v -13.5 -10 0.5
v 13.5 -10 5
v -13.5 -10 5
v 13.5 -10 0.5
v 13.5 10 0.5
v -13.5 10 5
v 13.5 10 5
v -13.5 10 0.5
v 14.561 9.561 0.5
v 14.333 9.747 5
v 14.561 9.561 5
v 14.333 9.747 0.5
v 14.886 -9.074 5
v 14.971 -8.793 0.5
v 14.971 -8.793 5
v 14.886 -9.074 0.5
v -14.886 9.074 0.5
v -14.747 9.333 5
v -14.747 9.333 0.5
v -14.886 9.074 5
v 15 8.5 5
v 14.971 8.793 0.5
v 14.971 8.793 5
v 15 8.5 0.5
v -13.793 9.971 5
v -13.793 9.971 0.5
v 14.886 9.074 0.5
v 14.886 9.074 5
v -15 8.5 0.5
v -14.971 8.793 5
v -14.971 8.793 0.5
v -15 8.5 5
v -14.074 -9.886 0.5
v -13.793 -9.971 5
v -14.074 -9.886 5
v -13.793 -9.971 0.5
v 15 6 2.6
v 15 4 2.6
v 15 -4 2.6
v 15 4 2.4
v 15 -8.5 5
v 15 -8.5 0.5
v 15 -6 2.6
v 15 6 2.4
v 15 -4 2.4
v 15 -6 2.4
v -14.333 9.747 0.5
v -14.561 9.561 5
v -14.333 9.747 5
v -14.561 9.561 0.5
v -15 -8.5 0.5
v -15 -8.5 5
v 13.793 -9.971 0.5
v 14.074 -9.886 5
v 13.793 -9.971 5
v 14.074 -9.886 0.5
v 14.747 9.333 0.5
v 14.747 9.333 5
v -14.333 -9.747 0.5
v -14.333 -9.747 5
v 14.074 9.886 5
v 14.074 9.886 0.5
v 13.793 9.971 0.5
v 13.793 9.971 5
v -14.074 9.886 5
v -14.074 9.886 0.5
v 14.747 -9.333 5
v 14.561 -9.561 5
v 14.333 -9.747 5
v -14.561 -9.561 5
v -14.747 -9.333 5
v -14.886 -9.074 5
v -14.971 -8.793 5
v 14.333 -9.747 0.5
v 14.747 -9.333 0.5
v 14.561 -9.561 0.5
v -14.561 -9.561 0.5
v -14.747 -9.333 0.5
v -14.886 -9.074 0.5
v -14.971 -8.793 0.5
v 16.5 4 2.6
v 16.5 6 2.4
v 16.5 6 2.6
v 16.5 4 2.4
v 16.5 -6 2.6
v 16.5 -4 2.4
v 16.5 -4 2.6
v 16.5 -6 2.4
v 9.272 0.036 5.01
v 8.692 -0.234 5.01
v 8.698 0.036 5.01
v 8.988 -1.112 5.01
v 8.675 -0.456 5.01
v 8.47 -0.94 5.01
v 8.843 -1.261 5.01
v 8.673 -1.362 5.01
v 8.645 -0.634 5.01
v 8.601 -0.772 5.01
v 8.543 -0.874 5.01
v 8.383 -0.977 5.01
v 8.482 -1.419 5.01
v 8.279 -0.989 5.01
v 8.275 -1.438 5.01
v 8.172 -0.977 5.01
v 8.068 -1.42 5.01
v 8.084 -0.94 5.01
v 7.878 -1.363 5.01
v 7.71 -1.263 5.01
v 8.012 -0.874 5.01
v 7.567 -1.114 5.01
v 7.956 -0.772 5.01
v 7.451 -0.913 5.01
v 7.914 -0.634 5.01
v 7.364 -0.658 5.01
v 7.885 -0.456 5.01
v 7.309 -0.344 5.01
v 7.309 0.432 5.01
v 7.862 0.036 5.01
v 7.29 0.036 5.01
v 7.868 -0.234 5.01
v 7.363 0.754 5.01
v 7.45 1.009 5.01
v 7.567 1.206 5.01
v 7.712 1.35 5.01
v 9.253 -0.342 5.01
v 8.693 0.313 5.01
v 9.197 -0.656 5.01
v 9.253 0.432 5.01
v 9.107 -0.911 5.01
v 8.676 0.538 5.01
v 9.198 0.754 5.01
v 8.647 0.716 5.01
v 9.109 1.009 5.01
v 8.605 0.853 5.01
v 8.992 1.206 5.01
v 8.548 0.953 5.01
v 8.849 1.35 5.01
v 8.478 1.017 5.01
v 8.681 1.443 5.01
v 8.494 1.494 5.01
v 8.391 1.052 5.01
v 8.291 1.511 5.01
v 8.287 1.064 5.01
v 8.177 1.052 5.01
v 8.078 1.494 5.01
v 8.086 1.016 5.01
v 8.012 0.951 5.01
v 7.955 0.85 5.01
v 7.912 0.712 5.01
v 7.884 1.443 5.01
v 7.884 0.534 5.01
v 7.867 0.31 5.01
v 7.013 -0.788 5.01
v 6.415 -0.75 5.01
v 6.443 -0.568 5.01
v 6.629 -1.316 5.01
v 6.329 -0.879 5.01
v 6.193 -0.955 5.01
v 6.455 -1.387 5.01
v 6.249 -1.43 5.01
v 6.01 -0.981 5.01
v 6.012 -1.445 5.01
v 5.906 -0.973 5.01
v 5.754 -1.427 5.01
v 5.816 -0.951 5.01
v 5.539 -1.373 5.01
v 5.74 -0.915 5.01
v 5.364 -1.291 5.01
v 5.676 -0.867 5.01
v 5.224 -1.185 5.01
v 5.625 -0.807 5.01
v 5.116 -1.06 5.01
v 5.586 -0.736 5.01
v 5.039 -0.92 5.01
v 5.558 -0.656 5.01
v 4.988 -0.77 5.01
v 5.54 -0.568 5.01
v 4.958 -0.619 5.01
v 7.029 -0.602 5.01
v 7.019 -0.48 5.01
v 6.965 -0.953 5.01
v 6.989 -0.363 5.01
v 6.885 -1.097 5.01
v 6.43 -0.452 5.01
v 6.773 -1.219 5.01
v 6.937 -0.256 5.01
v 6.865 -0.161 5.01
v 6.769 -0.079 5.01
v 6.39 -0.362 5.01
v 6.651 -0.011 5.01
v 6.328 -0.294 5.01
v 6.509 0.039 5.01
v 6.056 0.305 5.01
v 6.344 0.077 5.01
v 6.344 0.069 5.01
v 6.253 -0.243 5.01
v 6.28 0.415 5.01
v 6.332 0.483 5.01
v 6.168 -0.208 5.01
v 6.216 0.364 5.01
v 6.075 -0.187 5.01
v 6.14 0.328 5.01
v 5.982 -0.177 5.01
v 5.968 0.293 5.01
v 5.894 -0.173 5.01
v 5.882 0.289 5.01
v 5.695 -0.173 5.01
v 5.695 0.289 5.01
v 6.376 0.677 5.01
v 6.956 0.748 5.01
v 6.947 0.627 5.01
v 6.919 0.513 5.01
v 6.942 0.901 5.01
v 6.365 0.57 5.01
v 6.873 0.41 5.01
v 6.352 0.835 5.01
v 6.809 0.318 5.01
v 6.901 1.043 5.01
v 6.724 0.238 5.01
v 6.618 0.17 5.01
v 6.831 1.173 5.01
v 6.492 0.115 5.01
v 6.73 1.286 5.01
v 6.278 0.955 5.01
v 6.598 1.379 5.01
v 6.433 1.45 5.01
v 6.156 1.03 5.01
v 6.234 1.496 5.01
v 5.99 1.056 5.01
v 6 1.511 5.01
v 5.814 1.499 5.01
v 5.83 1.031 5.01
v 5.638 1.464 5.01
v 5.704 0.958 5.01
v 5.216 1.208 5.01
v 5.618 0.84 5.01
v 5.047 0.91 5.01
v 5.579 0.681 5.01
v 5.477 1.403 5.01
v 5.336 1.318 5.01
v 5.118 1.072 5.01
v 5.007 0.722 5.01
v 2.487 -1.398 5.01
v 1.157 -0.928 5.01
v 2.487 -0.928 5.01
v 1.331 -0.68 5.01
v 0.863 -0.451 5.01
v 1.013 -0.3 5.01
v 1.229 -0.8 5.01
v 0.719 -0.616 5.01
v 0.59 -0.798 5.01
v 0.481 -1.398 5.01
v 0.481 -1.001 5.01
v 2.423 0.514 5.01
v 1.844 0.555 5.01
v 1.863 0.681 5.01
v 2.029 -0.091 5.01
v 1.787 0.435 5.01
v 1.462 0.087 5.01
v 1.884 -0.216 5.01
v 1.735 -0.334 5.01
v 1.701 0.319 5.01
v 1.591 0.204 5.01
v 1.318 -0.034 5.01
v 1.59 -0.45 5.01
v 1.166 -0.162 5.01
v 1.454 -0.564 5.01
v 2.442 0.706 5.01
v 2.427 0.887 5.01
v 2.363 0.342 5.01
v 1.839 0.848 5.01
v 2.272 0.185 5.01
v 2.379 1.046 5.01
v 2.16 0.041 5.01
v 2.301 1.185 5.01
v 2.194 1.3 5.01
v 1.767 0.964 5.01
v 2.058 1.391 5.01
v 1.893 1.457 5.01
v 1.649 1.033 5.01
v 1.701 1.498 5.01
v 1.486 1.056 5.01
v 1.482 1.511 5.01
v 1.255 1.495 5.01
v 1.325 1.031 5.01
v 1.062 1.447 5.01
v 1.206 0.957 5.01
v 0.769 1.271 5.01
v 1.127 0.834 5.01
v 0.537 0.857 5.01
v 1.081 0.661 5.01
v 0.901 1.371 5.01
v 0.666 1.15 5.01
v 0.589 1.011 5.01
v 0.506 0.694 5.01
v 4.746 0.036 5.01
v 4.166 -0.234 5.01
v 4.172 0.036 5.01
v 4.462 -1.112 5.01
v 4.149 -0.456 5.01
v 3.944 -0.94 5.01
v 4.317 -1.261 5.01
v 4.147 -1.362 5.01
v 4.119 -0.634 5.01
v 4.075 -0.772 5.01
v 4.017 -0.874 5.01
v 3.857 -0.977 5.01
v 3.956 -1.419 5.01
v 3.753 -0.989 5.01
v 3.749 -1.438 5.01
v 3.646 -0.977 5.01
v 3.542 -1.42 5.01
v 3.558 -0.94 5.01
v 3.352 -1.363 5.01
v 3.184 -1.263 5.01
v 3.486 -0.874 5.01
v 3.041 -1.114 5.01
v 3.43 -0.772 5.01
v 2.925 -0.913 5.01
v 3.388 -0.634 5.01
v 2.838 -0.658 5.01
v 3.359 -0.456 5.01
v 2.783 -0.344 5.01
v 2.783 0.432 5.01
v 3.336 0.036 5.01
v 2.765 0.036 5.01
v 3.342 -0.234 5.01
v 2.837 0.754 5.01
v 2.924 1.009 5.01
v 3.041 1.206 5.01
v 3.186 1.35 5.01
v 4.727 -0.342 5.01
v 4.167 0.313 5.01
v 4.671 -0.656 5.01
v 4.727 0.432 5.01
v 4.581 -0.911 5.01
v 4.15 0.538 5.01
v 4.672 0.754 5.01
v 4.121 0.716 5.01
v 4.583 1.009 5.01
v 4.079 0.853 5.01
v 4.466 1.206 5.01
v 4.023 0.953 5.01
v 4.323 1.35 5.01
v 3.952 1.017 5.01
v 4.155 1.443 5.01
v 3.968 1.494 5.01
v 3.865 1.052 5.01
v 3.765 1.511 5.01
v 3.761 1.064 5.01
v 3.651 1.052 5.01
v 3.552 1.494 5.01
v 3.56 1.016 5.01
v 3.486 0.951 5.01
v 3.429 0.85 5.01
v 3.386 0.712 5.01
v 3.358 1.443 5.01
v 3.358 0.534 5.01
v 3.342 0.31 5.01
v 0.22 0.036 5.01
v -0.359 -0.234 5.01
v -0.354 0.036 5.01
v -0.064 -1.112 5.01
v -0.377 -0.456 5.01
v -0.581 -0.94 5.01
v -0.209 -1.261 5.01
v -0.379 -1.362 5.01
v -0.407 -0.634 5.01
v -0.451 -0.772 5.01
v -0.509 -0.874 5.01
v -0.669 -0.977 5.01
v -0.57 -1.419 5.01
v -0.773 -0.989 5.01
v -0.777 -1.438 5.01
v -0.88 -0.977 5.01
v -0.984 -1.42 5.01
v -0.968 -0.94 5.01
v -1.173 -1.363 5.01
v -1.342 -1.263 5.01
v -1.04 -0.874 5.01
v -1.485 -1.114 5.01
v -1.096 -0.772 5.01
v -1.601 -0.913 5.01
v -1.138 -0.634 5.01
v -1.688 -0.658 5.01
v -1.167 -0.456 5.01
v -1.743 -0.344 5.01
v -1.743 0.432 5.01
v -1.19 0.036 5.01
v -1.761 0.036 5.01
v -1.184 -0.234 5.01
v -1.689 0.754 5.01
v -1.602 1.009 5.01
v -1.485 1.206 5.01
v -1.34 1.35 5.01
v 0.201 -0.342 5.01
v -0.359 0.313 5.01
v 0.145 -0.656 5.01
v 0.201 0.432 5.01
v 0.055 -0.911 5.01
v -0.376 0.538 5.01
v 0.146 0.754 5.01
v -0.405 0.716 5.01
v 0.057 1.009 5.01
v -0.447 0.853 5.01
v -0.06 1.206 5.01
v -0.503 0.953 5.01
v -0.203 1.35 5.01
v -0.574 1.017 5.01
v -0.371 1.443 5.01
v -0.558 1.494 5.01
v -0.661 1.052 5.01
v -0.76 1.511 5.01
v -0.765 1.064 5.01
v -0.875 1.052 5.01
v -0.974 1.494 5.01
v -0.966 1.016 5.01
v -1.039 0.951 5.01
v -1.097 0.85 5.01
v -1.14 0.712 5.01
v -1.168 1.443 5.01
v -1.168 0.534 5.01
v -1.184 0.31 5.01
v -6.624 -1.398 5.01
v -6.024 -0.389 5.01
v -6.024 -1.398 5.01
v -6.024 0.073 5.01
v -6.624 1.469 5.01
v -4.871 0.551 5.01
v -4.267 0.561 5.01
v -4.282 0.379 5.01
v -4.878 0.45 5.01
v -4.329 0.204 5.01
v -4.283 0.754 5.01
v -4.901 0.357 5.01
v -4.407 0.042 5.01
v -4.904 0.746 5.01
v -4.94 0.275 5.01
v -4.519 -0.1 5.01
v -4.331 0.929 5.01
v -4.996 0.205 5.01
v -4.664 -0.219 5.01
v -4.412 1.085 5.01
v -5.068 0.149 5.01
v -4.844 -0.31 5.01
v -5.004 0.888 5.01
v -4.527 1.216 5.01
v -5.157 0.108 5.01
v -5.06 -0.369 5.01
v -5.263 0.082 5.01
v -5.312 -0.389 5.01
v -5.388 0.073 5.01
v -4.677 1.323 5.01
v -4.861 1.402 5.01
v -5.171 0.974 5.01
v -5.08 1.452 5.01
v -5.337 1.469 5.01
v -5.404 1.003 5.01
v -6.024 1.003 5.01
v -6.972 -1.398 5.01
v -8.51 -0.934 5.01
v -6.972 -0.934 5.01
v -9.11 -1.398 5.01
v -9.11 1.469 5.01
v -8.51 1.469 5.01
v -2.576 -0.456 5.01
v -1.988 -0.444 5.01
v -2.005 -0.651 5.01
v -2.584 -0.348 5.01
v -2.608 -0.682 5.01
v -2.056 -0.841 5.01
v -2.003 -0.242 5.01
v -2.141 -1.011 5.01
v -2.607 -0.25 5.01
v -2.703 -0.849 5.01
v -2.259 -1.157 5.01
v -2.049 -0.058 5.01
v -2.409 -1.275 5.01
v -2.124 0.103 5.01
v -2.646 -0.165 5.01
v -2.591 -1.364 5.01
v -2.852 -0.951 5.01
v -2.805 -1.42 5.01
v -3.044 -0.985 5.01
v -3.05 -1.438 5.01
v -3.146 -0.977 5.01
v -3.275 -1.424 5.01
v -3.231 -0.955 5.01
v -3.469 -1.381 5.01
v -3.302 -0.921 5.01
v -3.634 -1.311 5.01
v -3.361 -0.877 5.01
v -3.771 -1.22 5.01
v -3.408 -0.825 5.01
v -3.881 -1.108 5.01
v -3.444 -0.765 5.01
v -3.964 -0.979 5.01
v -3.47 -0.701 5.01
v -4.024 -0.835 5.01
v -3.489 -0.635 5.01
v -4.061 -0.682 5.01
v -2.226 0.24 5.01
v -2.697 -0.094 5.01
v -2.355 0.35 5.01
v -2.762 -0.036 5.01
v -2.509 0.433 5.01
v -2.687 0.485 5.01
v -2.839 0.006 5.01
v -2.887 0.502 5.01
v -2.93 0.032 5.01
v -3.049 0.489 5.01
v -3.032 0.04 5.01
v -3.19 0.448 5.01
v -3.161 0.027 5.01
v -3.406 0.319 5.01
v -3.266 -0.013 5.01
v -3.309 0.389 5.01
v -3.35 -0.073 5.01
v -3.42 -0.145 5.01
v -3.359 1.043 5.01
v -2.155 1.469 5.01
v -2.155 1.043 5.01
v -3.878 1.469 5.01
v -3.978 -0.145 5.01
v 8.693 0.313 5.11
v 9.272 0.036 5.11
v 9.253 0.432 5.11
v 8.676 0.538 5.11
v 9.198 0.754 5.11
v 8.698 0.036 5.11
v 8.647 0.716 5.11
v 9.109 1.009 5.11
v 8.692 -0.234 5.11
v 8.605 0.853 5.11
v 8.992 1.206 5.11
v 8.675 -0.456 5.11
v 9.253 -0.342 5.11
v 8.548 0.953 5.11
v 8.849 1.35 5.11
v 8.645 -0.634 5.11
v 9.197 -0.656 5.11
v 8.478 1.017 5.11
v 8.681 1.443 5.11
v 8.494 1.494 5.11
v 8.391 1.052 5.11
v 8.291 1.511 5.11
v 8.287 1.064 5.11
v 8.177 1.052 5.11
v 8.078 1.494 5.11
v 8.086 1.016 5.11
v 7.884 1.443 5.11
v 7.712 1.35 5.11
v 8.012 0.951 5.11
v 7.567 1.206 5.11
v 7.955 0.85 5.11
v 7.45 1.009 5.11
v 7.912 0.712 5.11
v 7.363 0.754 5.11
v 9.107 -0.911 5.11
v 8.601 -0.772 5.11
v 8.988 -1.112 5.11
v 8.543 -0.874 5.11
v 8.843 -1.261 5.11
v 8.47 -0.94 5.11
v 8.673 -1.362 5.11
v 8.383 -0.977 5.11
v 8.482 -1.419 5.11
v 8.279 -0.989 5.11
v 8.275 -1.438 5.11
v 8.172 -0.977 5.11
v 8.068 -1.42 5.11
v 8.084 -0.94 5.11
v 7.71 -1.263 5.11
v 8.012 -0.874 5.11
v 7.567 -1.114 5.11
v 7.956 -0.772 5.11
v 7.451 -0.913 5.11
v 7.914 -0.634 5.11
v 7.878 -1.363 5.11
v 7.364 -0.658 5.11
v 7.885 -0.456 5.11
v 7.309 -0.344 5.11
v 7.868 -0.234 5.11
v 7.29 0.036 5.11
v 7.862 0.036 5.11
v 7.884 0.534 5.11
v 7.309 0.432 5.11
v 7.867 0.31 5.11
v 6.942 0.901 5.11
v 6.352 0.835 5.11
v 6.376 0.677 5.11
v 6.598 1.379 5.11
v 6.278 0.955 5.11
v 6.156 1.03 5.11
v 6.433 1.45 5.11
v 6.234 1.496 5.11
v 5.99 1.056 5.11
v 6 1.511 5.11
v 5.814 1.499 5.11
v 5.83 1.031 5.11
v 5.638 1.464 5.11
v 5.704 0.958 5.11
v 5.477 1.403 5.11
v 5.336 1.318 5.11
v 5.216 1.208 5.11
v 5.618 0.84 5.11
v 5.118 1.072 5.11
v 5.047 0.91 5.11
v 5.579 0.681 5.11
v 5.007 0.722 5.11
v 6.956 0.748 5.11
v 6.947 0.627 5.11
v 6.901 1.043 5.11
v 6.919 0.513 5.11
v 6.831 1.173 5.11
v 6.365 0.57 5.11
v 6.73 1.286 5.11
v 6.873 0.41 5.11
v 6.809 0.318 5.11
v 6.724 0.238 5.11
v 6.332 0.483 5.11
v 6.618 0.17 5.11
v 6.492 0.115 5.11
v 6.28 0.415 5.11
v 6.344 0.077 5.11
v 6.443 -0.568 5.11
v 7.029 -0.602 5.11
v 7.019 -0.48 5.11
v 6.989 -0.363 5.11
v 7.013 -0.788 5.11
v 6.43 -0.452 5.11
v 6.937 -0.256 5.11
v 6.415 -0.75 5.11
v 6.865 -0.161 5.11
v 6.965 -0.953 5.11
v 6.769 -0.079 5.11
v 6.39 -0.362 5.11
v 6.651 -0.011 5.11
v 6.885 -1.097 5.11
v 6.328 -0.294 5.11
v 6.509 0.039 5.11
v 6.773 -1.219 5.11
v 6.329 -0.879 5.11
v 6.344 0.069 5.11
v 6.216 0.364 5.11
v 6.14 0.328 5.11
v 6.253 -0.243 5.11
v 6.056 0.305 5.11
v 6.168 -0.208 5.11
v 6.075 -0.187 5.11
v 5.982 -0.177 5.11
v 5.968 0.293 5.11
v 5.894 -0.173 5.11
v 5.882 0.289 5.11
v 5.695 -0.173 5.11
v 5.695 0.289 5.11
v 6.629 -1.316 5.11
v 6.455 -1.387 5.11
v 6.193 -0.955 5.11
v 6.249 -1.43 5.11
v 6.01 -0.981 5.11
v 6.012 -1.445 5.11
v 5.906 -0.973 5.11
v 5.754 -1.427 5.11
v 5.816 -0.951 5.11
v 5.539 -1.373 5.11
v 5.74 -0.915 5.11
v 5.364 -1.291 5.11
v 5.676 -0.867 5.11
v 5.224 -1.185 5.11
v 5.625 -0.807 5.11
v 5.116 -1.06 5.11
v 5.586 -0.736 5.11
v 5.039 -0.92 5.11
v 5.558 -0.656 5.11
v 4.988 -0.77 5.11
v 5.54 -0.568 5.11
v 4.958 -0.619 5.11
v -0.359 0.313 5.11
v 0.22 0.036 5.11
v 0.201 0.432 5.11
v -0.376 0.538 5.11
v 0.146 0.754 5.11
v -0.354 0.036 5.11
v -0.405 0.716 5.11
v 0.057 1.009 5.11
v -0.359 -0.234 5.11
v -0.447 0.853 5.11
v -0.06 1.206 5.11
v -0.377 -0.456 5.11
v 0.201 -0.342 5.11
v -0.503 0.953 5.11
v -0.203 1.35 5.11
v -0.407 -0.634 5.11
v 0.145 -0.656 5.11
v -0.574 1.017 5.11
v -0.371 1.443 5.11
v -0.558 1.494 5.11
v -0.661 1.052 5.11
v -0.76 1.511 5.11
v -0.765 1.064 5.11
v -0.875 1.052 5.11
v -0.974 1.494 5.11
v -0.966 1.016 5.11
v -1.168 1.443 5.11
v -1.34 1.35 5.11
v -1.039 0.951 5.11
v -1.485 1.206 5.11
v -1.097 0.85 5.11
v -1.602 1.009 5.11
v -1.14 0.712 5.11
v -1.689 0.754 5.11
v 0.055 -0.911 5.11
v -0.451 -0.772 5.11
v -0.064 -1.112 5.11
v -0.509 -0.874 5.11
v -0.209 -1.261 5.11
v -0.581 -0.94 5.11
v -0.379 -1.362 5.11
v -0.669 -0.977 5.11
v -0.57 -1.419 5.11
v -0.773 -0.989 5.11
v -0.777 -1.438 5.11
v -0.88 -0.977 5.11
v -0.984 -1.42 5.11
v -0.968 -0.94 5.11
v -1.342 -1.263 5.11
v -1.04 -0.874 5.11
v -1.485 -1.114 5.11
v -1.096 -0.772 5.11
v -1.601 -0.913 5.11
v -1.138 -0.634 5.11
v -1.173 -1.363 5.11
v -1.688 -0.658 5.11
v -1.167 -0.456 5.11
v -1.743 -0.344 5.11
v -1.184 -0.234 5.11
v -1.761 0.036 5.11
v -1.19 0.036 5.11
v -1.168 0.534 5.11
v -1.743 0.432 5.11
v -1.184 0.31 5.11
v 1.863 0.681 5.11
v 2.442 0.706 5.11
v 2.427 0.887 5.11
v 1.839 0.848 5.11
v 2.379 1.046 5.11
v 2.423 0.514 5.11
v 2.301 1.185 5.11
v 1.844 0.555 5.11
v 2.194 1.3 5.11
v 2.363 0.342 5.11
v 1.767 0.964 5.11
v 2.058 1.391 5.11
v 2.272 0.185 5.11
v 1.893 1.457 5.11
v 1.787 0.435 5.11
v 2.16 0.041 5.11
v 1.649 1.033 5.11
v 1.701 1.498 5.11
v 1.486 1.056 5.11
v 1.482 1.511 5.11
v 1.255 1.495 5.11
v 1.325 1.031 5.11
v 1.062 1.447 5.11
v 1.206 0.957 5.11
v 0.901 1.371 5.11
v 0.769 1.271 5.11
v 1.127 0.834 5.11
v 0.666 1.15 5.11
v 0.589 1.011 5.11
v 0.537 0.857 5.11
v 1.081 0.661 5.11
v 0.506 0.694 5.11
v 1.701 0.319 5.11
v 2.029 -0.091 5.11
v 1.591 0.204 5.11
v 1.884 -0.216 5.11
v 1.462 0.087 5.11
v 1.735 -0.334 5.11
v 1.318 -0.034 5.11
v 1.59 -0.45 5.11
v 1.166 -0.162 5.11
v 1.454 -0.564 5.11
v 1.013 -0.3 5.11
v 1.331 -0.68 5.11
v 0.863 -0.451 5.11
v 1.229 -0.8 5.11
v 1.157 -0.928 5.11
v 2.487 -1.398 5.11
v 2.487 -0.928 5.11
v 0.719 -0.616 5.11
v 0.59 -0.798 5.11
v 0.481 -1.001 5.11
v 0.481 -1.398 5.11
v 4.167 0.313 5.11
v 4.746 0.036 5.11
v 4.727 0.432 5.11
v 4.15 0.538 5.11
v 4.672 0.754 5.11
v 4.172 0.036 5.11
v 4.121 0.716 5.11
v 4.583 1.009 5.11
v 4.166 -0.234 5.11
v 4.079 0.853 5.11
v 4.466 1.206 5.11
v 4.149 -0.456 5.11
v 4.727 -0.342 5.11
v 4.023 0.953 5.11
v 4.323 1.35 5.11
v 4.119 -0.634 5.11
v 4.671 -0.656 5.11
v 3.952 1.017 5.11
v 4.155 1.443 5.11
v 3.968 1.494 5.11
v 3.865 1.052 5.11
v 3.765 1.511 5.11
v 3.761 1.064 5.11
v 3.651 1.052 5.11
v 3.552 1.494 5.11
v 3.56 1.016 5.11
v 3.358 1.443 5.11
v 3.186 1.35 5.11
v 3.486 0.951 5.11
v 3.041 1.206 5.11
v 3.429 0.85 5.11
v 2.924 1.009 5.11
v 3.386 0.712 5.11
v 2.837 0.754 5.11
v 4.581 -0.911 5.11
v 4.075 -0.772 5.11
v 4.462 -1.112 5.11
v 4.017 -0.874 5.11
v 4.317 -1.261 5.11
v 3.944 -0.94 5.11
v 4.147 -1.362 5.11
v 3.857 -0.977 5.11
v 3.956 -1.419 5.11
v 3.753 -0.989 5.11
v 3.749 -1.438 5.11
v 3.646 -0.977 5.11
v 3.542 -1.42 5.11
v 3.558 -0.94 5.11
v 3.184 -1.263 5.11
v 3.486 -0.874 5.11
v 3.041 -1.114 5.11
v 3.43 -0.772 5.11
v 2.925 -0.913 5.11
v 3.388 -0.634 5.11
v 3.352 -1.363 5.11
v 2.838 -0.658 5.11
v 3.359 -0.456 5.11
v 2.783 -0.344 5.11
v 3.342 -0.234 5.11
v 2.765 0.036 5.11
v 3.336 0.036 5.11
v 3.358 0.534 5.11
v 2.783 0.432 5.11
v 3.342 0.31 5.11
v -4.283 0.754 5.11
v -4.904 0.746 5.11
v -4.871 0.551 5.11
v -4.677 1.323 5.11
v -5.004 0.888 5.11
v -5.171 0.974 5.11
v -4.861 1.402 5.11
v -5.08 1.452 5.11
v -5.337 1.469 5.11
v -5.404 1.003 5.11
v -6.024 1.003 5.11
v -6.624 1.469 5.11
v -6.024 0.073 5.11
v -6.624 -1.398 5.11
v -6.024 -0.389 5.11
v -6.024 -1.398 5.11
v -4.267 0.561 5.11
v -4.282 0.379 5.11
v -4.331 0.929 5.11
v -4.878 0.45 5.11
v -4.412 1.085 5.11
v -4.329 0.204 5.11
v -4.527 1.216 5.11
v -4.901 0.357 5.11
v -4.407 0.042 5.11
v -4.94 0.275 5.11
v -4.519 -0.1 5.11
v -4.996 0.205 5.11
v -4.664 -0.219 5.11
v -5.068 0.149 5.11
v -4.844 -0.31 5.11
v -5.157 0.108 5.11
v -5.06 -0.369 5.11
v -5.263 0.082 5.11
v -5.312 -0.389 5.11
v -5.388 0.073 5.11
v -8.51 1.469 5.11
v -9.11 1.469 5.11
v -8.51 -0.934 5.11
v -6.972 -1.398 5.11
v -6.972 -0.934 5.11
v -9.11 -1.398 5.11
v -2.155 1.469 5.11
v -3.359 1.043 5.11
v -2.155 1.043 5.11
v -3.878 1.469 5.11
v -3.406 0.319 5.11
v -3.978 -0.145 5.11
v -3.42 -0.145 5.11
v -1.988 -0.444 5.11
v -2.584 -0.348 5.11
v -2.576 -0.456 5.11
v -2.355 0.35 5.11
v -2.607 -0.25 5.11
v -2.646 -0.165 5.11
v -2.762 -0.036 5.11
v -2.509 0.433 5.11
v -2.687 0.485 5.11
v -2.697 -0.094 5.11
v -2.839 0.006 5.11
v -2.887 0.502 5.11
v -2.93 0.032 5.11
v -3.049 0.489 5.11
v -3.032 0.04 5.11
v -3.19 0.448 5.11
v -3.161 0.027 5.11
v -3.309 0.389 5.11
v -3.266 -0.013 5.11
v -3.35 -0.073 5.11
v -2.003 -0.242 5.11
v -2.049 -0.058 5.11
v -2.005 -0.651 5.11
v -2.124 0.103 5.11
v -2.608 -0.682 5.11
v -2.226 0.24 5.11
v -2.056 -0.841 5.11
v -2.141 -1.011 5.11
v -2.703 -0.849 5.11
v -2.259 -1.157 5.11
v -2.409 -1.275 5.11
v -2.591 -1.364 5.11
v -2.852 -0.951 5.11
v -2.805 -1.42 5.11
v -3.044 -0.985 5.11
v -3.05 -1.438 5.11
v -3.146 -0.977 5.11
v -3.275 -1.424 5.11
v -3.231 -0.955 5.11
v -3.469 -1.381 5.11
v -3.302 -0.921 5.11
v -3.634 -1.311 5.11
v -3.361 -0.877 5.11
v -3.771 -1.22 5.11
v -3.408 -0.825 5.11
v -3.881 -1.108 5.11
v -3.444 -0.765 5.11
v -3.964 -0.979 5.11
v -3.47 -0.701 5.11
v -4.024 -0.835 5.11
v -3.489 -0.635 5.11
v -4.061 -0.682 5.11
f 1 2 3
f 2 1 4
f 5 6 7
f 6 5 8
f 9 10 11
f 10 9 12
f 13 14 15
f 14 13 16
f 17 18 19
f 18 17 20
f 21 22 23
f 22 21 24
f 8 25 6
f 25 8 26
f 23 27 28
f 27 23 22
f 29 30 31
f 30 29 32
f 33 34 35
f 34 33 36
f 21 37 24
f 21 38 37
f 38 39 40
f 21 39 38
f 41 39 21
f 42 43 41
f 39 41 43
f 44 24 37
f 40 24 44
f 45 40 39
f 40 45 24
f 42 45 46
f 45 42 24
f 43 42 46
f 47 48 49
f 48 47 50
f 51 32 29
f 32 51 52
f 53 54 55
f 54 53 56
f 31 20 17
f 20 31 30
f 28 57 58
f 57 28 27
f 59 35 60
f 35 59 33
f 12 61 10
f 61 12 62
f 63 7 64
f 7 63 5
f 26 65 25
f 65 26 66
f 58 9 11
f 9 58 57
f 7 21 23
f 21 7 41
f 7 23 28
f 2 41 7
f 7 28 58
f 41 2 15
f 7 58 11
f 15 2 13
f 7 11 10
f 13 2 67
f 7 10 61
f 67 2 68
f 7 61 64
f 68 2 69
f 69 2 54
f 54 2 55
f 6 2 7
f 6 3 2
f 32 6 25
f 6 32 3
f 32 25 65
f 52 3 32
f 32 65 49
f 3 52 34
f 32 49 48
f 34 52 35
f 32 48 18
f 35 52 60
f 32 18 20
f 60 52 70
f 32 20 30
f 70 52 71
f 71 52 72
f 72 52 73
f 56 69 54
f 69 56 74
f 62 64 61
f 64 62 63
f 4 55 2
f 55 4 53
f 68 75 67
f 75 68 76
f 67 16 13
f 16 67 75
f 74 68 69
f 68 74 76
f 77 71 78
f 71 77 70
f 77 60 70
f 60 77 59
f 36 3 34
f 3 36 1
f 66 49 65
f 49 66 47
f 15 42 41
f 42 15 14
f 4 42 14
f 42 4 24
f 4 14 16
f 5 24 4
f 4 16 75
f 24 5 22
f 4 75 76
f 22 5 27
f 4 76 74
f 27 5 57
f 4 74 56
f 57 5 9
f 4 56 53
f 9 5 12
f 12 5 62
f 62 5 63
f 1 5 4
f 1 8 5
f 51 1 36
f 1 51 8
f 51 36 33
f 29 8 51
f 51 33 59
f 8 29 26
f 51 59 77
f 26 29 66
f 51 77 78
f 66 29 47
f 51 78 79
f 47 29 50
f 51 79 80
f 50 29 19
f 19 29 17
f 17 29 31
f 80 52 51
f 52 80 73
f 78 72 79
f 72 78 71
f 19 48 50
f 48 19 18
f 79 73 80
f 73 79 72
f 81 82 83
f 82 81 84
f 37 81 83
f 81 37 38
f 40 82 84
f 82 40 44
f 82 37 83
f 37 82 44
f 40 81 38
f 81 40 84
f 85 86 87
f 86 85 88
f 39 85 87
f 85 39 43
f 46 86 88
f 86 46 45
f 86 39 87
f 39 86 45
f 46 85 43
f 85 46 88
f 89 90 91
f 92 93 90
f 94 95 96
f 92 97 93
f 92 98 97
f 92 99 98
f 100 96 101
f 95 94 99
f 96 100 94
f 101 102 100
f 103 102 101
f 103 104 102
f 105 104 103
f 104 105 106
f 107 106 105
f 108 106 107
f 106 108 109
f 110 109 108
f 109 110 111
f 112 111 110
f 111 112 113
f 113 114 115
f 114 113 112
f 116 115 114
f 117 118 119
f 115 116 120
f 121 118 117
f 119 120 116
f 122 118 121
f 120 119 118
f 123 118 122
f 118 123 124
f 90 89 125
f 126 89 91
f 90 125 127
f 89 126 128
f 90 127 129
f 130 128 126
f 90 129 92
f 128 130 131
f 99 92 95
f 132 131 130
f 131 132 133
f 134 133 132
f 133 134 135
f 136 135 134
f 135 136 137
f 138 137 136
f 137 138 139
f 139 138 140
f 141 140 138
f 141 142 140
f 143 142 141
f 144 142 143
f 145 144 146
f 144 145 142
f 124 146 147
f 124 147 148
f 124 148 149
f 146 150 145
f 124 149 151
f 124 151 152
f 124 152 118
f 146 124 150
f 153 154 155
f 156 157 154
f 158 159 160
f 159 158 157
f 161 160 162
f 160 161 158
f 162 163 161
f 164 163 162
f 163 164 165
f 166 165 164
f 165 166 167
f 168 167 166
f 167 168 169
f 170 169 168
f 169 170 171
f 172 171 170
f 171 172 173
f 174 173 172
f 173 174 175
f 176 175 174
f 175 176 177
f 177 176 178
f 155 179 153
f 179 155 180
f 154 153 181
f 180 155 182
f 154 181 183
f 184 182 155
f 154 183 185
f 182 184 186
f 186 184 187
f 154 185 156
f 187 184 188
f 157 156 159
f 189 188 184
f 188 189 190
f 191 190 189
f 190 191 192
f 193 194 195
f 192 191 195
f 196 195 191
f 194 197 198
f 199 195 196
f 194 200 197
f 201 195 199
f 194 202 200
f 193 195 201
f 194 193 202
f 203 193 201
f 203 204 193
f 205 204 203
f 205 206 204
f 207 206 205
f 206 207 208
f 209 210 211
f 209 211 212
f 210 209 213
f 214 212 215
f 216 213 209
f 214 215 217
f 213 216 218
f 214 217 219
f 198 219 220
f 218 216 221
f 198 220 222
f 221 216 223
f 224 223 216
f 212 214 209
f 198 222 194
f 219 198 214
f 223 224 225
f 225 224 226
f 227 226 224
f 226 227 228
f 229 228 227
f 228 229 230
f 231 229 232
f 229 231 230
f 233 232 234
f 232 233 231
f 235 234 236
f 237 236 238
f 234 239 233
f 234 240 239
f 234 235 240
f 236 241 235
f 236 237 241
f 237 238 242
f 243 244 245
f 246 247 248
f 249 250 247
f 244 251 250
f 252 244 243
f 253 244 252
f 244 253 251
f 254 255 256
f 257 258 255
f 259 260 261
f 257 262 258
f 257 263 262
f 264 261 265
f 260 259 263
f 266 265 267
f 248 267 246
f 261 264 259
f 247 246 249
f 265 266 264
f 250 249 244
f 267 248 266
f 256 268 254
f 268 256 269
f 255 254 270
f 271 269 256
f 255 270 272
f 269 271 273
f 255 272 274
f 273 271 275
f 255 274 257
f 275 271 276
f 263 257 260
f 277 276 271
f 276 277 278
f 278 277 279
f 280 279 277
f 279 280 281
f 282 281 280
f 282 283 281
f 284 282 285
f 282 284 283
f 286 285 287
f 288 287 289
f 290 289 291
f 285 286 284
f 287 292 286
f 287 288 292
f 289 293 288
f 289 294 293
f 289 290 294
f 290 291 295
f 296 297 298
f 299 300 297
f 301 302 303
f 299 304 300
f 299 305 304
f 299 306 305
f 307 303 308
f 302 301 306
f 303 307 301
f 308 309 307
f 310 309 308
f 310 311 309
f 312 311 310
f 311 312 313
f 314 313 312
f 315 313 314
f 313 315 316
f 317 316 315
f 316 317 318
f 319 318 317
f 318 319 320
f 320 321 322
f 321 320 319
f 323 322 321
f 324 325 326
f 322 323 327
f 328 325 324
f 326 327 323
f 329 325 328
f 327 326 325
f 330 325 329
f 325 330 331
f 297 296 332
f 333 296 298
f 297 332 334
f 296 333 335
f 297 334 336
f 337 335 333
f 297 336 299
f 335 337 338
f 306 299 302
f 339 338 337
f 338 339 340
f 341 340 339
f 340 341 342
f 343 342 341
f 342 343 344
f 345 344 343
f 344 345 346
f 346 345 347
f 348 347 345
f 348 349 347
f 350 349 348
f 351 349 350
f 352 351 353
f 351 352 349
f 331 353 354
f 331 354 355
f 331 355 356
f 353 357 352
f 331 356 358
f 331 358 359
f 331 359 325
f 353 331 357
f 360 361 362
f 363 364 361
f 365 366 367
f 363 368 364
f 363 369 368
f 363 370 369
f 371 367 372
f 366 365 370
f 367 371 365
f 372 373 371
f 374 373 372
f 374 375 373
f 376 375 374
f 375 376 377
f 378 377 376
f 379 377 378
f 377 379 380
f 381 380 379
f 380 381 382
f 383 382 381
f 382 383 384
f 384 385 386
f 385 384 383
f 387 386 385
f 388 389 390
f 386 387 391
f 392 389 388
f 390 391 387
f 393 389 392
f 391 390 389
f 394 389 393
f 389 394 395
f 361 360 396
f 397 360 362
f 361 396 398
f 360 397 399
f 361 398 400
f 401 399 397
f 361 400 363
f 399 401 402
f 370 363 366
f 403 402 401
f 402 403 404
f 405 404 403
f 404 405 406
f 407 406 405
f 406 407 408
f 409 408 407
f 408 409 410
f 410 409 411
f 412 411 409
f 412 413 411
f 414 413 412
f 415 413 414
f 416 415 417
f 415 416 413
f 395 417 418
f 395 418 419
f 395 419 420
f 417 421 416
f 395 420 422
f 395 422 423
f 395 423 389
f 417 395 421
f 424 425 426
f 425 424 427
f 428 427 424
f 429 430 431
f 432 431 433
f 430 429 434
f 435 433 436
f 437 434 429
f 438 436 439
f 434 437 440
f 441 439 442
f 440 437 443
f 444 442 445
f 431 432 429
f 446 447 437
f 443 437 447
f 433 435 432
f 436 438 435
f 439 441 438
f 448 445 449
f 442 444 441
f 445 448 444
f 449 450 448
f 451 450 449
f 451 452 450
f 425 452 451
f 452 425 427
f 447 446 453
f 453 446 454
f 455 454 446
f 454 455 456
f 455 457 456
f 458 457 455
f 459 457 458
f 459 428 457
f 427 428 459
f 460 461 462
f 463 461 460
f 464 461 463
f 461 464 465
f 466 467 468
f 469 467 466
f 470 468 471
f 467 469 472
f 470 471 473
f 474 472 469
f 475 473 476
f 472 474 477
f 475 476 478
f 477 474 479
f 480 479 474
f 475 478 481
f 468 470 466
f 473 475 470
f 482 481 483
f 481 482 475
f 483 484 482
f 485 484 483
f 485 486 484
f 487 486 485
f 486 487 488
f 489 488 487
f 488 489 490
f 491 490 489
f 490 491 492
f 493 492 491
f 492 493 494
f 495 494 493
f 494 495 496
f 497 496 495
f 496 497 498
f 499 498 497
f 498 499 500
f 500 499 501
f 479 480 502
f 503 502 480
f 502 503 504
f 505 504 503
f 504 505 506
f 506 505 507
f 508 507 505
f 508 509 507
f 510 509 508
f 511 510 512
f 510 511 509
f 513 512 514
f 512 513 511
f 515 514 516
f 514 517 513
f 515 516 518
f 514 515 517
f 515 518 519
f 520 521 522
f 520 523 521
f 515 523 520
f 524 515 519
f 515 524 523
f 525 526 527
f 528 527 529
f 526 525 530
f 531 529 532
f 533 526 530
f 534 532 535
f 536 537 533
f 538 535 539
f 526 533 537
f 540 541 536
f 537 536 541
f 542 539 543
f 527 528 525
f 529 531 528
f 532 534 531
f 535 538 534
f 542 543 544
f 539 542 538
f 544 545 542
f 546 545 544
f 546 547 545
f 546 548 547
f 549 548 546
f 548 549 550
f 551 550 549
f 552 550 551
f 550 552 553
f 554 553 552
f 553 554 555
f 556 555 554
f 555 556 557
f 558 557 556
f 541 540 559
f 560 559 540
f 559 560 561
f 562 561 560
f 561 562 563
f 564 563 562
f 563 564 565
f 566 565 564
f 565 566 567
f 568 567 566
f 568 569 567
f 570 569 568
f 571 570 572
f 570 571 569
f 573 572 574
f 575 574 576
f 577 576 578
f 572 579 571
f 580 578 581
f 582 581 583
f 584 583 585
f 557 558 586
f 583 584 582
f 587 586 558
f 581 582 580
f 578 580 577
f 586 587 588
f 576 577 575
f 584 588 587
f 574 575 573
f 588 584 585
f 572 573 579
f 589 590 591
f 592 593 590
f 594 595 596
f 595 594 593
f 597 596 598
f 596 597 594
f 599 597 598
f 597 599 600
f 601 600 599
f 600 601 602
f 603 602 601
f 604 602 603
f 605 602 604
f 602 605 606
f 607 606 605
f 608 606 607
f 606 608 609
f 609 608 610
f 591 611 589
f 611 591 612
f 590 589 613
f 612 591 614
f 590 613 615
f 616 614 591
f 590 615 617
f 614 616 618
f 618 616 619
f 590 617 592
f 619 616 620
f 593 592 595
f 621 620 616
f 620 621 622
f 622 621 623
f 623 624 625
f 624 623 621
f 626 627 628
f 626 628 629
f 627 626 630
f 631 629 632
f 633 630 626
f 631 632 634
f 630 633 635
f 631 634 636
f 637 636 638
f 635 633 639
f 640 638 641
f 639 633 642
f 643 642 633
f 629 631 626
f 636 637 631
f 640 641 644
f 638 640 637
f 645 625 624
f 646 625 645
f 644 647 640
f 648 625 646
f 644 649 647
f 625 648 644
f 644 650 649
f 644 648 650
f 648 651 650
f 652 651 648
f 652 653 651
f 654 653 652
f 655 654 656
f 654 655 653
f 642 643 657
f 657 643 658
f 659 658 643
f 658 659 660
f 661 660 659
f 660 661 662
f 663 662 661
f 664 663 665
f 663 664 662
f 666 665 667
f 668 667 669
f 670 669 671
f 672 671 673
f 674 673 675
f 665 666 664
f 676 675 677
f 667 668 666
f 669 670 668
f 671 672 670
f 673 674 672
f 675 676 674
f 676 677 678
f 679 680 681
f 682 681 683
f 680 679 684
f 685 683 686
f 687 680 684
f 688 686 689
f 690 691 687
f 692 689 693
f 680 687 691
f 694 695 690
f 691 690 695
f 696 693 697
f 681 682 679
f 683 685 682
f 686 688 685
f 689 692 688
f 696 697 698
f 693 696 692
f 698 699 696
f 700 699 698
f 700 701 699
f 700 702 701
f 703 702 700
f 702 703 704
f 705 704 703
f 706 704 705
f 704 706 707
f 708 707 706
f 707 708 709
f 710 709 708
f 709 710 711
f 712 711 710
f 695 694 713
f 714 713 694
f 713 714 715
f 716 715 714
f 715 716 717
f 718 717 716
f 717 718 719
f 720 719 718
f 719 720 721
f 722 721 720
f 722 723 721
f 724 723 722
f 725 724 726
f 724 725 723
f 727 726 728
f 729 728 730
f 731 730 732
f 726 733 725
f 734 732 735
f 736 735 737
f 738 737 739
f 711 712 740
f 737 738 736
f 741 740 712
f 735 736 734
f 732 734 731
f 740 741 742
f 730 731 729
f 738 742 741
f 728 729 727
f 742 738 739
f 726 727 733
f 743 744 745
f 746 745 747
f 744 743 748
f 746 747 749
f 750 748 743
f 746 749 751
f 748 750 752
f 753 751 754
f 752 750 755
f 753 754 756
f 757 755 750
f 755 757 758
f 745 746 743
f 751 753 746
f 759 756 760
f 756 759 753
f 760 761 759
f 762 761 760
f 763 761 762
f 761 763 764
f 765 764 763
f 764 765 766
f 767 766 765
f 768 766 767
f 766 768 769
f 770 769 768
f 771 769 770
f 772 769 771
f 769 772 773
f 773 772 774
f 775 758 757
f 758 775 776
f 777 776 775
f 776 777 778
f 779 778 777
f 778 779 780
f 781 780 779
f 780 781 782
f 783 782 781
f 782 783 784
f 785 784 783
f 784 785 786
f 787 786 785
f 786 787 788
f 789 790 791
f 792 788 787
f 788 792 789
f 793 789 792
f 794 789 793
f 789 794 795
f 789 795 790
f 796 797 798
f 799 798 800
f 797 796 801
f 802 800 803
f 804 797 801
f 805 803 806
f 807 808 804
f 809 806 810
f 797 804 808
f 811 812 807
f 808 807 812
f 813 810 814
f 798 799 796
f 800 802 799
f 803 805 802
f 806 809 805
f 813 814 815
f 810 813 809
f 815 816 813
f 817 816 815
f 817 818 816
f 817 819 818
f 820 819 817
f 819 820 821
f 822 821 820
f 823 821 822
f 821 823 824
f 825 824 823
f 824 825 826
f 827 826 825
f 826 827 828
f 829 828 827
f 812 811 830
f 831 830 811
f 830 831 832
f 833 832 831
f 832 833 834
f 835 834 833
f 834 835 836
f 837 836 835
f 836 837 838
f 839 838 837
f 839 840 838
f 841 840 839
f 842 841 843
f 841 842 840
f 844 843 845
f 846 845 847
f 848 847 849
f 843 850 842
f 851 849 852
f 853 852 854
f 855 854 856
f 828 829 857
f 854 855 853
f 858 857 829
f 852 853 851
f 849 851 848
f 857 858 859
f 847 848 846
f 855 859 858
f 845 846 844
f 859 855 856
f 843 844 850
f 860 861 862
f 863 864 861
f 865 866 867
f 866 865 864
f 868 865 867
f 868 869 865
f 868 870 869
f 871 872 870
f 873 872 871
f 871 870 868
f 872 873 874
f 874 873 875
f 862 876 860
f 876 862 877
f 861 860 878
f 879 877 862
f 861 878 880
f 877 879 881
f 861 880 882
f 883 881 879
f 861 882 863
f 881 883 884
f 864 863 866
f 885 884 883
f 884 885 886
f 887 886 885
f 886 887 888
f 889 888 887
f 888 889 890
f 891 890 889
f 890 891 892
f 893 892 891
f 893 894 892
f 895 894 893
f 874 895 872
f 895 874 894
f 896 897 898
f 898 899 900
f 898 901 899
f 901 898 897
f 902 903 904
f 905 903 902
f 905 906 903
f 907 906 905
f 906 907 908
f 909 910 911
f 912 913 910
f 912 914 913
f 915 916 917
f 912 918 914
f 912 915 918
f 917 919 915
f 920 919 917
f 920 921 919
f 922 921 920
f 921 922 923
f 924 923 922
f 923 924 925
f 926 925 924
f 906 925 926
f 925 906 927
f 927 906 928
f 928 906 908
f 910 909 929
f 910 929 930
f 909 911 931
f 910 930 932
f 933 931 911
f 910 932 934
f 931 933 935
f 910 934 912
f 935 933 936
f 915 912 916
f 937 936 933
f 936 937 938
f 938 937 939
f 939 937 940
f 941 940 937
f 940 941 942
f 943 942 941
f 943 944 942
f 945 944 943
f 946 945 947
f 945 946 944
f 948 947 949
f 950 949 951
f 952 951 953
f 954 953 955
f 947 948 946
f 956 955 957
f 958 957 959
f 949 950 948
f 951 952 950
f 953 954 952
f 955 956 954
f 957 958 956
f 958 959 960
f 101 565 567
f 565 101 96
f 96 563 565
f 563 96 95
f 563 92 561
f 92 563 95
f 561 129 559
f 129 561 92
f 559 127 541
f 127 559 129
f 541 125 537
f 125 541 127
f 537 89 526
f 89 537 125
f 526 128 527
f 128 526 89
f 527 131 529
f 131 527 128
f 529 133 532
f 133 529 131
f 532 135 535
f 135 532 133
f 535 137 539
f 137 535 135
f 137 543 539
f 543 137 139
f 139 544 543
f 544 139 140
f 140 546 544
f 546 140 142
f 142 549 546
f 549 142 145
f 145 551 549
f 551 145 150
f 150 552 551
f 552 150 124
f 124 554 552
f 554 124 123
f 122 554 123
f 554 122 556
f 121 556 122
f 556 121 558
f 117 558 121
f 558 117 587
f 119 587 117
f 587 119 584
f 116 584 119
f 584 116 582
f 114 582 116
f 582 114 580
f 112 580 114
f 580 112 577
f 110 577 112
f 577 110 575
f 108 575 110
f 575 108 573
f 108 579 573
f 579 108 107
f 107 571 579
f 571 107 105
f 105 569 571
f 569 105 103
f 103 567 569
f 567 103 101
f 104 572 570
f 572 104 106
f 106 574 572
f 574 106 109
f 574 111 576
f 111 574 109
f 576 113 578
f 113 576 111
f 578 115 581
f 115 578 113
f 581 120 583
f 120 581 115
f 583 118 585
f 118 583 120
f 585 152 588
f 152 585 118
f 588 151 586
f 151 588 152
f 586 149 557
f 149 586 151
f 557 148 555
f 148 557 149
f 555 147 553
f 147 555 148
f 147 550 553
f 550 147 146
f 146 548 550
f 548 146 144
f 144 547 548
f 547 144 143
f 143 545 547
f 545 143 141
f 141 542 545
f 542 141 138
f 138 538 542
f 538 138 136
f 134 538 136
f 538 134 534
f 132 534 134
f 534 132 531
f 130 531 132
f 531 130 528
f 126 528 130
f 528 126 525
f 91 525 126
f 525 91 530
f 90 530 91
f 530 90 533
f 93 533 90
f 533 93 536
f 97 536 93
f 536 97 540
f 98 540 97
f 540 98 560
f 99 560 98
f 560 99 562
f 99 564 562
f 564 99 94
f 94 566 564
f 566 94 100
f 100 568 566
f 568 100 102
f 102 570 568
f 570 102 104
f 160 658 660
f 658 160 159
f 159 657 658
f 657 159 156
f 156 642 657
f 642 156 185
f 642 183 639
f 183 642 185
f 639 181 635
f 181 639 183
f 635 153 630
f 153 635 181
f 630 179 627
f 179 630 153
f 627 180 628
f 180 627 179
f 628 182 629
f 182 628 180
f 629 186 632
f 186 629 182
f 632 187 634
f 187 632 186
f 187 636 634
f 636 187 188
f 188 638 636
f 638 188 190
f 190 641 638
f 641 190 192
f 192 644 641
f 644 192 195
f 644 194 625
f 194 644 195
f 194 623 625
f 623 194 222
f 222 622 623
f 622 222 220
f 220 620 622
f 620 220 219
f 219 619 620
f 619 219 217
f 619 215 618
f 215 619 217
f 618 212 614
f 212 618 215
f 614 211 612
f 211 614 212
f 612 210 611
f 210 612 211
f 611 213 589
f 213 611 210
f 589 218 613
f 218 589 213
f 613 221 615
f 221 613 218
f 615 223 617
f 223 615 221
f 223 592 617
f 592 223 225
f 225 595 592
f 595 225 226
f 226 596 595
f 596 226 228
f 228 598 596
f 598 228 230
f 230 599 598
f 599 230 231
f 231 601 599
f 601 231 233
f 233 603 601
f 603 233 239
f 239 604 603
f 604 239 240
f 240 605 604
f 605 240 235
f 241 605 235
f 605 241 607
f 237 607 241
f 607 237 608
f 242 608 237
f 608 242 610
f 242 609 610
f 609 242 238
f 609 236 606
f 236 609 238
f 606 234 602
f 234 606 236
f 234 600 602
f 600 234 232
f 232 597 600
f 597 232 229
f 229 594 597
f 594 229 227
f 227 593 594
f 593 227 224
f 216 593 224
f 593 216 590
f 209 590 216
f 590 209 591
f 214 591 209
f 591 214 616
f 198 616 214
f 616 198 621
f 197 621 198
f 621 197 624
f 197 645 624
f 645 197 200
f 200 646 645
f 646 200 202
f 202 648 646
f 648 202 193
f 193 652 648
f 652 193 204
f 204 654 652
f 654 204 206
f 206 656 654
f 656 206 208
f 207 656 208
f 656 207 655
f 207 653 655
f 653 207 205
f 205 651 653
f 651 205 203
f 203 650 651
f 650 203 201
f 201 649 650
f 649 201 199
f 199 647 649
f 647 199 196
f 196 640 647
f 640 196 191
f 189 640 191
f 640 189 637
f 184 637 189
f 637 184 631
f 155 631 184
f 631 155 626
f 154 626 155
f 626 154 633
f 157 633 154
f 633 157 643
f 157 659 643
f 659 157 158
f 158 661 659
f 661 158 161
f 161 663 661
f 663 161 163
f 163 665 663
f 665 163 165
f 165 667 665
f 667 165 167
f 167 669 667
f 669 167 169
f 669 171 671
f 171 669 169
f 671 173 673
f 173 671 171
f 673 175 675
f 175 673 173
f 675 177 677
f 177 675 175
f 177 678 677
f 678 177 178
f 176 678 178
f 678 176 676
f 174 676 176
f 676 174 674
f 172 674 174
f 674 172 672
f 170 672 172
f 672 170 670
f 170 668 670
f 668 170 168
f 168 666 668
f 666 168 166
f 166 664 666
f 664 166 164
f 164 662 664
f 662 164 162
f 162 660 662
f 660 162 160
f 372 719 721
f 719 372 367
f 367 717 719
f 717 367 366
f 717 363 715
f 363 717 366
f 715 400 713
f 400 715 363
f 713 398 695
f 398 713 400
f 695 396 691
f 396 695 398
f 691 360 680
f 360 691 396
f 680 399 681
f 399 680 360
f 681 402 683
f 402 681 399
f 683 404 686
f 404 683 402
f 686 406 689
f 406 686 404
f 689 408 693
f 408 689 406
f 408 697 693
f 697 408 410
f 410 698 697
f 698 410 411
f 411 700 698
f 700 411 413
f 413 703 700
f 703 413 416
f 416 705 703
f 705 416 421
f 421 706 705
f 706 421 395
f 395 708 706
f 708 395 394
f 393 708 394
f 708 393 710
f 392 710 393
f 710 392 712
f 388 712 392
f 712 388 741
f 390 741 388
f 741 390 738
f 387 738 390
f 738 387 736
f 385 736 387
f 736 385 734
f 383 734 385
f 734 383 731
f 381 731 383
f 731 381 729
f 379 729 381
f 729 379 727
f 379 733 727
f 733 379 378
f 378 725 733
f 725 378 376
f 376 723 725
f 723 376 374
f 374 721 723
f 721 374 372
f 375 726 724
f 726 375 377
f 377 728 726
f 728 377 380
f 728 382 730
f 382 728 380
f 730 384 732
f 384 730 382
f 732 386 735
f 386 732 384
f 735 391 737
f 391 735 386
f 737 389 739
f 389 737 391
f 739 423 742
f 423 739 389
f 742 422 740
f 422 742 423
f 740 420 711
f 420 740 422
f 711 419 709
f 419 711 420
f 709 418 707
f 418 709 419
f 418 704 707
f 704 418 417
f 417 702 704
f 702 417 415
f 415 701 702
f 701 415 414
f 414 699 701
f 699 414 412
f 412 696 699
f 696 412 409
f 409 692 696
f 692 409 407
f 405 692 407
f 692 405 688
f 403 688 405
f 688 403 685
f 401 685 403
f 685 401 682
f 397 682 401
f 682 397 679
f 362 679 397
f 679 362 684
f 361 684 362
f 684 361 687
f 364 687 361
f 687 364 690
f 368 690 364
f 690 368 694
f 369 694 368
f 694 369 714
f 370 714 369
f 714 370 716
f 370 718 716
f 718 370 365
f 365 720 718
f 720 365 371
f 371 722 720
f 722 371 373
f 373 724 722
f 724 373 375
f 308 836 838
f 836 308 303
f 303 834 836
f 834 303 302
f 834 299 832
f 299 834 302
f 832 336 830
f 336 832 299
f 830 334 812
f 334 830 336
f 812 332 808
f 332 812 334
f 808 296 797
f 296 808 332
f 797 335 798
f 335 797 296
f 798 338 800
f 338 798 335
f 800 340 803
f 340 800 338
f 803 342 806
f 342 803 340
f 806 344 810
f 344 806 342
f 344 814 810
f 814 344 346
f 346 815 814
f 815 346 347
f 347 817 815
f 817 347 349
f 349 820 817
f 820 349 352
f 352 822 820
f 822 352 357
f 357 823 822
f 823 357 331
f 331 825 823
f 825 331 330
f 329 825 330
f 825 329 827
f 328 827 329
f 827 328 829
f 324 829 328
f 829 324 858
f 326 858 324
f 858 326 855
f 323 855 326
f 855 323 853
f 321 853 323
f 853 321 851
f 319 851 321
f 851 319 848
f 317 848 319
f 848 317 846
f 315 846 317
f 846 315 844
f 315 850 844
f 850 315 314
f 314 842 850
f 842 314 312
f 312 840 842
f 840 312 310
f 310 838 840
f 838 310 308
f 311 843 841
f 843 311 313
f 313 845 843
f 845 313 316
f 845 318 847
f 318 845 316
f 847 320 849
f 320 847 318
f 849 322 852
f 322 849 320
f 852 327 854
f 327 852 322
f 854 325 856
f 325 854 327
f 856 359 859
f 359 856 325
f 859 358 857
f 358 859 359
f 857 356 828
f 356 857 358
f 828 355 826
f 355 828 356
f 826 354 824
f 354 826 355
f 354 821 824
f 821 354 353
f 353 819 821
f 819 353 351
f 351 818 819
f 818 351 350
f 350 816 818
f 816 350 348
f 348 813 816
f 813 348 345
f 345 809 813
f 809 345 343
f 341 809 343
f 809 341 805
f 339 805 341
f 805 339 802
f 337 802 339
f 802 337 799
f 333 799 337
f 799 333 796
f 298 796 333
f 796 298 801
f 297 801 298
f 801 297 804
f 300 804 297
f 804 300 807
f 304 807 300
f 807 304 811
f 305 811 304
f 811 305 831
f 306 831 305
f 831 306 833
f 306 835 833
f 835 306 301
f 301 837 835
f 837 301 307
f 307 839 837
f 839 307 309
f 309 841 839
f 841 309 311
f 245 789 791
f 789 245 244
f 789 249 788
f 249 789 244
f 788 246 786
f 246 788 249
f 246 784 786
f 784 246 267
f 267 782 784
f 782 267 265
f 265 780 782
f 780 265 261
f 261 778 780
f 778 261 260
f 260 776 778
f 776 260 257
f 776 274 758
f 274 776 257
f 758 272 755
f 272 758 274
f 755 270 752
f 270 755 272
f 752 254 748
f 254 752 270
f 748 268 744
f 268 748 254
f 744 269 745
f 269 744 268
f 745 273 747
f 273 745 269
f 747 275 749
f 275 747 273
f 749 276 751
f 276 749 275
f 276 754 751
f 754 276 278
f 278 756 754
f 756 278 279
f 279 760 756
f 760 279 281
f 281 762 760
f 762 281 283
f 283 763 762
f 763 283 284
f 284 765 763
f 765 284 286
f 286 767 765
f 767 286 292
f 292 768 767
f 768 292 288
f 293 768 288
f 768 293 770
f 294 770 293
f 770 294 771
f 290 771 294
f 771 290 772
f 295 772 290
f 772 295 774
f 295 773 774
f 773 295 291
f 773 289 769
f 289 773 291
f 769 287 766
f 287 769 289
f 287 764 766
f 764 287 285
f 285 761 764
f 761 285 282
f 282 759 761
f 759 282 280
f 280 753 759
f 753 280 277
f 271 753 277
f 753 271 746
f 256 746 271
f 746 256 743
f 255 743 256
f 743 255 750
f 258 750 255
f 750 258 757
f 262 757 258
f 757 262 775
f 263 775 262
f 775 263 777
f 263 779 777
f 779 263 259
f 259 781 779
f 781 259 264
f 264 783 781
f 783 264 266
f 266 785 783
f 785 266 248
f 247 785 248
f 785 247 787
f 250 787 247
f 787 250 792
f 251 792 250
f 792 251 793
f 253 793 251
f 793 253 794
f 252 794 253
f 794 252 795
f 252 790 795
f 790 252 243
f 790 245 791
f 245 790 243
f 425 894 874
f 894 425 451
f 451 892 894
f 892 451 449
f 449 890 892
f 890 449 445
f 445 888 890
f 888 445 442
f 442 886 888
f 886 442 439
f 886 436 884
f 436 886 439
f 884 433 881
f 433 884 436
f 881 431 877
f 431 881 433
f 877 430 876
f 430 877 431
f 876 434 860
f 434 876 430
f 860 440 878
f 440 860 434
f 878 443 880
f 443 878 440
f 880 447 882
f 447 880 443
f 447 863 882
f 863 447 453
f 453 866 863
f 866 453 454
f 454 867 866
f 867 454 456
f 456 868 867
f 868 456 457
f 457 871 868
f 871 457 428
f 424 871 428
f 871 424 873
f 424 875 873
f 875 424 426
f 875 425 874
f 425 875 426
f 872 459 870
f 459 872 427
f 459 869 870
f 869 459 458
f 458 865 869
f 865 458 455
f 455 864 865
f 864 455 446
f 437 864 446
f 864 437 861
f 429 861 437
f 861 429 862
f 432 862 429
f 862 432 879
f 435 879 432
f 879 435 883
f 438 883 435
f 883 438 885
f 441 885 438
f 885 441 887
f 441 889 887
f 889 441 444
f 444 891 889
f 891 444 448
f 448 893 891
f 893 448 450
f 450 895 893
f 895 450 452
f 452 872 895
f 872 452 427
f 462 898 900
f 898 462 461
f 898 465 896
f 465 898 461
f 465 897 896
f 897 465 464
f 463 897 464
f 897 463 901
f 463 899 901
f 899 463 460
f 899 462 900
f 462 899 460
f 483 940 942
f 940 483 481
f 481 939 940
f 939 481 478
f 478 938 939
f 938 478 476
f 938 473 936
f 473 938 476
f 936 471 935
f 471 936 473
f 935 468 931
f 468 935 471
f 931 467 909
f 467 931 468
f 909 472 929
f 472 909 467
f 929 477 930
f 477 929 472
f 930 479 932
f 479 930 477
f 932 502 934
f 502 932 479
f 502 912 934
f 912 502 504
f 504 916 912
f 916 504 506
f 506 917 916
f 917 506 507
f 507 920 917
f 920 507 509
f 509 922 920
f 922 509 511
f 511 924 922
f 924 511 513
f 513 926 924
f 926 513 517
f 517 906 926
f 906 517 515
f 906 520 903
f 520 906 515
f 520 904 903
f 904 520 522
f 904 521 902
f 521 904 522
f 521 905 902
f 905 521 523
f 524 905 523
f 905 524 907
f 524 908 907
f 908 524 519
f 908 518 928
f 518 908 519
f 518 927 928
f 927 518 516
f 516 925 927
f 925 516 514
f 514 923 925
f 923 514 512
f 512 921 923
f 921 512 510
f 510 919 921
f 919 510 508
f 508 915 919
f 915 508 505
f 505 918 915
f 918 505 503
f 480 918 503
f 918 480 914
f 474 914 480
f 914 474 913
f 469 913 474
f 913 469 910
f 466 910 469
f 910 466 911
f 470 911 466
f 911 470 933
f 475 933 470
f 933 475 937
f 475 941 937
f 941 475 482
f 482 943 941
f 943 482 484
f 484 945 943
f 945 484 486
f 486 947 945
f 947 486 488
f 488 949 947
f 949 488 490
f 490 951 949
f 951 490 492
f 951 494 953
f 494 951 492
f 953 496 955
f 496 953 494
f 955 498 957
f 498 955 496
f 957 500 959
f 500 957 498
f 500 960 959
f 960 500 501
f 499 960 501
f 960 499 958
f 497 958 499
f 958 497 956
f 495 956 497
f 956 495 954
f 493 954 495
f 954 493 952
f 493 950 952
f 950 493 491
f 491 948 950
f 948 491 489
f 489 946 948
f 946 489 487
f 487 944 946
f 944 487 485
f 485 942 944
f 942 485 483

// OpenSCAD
// =============================================================================
// InkTime Smartwatch - Battery 3D Model
// Component: Akyga AKY0106 (LP502030) LiPo Battery
// Dimensions from datasheet: 30 x 20 x 5 mm (L x W x H)
// Capacity: 250 mAh, Voltage: 3.7V
// =============================================================================
// Note: Battery will be soldered directly to test pads on the PCB
// (no JST connector used, to save space)
// =============================================================================

module battery_AKY0106() {
    // Main battery body dimensions (mm)
    battery_length = 30;
    battery_width  = 20;
    battery_height = 5;
    
    // Corner radius for the pouch cell
    corner_r = 1.5;
    
    color("Silver", 0.85)
    translate([0, 0, battery_height/2])
    minkowski() {
        cube([
            battery_length - 2*corner_r,
            battery_width - 2*corner_r,
            battery_height - 1
        ], center=true);
        cylinder(r=corner_r, h=0.5, $fn=32);
    }
    
    // Solder tab / wire leads (simplified - 2 pads)
    // Positive tab
    color("Red")
    translate([battery_length/2, battery_width/4, battery_height/2])
    cube([3, 2, 0.2], center=true);
    
    // Negative tab
    color("Black")
    translate([battery_length/2, -battery_width/4, battery_height/2])
    cube([3, 2, 0.2], center=true);
    
    // Label on battery
    color("DimGray")
    translate([0, 0, battery_height + 0.01])
    linear_extrude(0.1)
    text("LP502030", size=3, halign="center", valign="center", font="Liberation Sans:style=Bold");
}

// Render the battery
battery_AKY0106();
